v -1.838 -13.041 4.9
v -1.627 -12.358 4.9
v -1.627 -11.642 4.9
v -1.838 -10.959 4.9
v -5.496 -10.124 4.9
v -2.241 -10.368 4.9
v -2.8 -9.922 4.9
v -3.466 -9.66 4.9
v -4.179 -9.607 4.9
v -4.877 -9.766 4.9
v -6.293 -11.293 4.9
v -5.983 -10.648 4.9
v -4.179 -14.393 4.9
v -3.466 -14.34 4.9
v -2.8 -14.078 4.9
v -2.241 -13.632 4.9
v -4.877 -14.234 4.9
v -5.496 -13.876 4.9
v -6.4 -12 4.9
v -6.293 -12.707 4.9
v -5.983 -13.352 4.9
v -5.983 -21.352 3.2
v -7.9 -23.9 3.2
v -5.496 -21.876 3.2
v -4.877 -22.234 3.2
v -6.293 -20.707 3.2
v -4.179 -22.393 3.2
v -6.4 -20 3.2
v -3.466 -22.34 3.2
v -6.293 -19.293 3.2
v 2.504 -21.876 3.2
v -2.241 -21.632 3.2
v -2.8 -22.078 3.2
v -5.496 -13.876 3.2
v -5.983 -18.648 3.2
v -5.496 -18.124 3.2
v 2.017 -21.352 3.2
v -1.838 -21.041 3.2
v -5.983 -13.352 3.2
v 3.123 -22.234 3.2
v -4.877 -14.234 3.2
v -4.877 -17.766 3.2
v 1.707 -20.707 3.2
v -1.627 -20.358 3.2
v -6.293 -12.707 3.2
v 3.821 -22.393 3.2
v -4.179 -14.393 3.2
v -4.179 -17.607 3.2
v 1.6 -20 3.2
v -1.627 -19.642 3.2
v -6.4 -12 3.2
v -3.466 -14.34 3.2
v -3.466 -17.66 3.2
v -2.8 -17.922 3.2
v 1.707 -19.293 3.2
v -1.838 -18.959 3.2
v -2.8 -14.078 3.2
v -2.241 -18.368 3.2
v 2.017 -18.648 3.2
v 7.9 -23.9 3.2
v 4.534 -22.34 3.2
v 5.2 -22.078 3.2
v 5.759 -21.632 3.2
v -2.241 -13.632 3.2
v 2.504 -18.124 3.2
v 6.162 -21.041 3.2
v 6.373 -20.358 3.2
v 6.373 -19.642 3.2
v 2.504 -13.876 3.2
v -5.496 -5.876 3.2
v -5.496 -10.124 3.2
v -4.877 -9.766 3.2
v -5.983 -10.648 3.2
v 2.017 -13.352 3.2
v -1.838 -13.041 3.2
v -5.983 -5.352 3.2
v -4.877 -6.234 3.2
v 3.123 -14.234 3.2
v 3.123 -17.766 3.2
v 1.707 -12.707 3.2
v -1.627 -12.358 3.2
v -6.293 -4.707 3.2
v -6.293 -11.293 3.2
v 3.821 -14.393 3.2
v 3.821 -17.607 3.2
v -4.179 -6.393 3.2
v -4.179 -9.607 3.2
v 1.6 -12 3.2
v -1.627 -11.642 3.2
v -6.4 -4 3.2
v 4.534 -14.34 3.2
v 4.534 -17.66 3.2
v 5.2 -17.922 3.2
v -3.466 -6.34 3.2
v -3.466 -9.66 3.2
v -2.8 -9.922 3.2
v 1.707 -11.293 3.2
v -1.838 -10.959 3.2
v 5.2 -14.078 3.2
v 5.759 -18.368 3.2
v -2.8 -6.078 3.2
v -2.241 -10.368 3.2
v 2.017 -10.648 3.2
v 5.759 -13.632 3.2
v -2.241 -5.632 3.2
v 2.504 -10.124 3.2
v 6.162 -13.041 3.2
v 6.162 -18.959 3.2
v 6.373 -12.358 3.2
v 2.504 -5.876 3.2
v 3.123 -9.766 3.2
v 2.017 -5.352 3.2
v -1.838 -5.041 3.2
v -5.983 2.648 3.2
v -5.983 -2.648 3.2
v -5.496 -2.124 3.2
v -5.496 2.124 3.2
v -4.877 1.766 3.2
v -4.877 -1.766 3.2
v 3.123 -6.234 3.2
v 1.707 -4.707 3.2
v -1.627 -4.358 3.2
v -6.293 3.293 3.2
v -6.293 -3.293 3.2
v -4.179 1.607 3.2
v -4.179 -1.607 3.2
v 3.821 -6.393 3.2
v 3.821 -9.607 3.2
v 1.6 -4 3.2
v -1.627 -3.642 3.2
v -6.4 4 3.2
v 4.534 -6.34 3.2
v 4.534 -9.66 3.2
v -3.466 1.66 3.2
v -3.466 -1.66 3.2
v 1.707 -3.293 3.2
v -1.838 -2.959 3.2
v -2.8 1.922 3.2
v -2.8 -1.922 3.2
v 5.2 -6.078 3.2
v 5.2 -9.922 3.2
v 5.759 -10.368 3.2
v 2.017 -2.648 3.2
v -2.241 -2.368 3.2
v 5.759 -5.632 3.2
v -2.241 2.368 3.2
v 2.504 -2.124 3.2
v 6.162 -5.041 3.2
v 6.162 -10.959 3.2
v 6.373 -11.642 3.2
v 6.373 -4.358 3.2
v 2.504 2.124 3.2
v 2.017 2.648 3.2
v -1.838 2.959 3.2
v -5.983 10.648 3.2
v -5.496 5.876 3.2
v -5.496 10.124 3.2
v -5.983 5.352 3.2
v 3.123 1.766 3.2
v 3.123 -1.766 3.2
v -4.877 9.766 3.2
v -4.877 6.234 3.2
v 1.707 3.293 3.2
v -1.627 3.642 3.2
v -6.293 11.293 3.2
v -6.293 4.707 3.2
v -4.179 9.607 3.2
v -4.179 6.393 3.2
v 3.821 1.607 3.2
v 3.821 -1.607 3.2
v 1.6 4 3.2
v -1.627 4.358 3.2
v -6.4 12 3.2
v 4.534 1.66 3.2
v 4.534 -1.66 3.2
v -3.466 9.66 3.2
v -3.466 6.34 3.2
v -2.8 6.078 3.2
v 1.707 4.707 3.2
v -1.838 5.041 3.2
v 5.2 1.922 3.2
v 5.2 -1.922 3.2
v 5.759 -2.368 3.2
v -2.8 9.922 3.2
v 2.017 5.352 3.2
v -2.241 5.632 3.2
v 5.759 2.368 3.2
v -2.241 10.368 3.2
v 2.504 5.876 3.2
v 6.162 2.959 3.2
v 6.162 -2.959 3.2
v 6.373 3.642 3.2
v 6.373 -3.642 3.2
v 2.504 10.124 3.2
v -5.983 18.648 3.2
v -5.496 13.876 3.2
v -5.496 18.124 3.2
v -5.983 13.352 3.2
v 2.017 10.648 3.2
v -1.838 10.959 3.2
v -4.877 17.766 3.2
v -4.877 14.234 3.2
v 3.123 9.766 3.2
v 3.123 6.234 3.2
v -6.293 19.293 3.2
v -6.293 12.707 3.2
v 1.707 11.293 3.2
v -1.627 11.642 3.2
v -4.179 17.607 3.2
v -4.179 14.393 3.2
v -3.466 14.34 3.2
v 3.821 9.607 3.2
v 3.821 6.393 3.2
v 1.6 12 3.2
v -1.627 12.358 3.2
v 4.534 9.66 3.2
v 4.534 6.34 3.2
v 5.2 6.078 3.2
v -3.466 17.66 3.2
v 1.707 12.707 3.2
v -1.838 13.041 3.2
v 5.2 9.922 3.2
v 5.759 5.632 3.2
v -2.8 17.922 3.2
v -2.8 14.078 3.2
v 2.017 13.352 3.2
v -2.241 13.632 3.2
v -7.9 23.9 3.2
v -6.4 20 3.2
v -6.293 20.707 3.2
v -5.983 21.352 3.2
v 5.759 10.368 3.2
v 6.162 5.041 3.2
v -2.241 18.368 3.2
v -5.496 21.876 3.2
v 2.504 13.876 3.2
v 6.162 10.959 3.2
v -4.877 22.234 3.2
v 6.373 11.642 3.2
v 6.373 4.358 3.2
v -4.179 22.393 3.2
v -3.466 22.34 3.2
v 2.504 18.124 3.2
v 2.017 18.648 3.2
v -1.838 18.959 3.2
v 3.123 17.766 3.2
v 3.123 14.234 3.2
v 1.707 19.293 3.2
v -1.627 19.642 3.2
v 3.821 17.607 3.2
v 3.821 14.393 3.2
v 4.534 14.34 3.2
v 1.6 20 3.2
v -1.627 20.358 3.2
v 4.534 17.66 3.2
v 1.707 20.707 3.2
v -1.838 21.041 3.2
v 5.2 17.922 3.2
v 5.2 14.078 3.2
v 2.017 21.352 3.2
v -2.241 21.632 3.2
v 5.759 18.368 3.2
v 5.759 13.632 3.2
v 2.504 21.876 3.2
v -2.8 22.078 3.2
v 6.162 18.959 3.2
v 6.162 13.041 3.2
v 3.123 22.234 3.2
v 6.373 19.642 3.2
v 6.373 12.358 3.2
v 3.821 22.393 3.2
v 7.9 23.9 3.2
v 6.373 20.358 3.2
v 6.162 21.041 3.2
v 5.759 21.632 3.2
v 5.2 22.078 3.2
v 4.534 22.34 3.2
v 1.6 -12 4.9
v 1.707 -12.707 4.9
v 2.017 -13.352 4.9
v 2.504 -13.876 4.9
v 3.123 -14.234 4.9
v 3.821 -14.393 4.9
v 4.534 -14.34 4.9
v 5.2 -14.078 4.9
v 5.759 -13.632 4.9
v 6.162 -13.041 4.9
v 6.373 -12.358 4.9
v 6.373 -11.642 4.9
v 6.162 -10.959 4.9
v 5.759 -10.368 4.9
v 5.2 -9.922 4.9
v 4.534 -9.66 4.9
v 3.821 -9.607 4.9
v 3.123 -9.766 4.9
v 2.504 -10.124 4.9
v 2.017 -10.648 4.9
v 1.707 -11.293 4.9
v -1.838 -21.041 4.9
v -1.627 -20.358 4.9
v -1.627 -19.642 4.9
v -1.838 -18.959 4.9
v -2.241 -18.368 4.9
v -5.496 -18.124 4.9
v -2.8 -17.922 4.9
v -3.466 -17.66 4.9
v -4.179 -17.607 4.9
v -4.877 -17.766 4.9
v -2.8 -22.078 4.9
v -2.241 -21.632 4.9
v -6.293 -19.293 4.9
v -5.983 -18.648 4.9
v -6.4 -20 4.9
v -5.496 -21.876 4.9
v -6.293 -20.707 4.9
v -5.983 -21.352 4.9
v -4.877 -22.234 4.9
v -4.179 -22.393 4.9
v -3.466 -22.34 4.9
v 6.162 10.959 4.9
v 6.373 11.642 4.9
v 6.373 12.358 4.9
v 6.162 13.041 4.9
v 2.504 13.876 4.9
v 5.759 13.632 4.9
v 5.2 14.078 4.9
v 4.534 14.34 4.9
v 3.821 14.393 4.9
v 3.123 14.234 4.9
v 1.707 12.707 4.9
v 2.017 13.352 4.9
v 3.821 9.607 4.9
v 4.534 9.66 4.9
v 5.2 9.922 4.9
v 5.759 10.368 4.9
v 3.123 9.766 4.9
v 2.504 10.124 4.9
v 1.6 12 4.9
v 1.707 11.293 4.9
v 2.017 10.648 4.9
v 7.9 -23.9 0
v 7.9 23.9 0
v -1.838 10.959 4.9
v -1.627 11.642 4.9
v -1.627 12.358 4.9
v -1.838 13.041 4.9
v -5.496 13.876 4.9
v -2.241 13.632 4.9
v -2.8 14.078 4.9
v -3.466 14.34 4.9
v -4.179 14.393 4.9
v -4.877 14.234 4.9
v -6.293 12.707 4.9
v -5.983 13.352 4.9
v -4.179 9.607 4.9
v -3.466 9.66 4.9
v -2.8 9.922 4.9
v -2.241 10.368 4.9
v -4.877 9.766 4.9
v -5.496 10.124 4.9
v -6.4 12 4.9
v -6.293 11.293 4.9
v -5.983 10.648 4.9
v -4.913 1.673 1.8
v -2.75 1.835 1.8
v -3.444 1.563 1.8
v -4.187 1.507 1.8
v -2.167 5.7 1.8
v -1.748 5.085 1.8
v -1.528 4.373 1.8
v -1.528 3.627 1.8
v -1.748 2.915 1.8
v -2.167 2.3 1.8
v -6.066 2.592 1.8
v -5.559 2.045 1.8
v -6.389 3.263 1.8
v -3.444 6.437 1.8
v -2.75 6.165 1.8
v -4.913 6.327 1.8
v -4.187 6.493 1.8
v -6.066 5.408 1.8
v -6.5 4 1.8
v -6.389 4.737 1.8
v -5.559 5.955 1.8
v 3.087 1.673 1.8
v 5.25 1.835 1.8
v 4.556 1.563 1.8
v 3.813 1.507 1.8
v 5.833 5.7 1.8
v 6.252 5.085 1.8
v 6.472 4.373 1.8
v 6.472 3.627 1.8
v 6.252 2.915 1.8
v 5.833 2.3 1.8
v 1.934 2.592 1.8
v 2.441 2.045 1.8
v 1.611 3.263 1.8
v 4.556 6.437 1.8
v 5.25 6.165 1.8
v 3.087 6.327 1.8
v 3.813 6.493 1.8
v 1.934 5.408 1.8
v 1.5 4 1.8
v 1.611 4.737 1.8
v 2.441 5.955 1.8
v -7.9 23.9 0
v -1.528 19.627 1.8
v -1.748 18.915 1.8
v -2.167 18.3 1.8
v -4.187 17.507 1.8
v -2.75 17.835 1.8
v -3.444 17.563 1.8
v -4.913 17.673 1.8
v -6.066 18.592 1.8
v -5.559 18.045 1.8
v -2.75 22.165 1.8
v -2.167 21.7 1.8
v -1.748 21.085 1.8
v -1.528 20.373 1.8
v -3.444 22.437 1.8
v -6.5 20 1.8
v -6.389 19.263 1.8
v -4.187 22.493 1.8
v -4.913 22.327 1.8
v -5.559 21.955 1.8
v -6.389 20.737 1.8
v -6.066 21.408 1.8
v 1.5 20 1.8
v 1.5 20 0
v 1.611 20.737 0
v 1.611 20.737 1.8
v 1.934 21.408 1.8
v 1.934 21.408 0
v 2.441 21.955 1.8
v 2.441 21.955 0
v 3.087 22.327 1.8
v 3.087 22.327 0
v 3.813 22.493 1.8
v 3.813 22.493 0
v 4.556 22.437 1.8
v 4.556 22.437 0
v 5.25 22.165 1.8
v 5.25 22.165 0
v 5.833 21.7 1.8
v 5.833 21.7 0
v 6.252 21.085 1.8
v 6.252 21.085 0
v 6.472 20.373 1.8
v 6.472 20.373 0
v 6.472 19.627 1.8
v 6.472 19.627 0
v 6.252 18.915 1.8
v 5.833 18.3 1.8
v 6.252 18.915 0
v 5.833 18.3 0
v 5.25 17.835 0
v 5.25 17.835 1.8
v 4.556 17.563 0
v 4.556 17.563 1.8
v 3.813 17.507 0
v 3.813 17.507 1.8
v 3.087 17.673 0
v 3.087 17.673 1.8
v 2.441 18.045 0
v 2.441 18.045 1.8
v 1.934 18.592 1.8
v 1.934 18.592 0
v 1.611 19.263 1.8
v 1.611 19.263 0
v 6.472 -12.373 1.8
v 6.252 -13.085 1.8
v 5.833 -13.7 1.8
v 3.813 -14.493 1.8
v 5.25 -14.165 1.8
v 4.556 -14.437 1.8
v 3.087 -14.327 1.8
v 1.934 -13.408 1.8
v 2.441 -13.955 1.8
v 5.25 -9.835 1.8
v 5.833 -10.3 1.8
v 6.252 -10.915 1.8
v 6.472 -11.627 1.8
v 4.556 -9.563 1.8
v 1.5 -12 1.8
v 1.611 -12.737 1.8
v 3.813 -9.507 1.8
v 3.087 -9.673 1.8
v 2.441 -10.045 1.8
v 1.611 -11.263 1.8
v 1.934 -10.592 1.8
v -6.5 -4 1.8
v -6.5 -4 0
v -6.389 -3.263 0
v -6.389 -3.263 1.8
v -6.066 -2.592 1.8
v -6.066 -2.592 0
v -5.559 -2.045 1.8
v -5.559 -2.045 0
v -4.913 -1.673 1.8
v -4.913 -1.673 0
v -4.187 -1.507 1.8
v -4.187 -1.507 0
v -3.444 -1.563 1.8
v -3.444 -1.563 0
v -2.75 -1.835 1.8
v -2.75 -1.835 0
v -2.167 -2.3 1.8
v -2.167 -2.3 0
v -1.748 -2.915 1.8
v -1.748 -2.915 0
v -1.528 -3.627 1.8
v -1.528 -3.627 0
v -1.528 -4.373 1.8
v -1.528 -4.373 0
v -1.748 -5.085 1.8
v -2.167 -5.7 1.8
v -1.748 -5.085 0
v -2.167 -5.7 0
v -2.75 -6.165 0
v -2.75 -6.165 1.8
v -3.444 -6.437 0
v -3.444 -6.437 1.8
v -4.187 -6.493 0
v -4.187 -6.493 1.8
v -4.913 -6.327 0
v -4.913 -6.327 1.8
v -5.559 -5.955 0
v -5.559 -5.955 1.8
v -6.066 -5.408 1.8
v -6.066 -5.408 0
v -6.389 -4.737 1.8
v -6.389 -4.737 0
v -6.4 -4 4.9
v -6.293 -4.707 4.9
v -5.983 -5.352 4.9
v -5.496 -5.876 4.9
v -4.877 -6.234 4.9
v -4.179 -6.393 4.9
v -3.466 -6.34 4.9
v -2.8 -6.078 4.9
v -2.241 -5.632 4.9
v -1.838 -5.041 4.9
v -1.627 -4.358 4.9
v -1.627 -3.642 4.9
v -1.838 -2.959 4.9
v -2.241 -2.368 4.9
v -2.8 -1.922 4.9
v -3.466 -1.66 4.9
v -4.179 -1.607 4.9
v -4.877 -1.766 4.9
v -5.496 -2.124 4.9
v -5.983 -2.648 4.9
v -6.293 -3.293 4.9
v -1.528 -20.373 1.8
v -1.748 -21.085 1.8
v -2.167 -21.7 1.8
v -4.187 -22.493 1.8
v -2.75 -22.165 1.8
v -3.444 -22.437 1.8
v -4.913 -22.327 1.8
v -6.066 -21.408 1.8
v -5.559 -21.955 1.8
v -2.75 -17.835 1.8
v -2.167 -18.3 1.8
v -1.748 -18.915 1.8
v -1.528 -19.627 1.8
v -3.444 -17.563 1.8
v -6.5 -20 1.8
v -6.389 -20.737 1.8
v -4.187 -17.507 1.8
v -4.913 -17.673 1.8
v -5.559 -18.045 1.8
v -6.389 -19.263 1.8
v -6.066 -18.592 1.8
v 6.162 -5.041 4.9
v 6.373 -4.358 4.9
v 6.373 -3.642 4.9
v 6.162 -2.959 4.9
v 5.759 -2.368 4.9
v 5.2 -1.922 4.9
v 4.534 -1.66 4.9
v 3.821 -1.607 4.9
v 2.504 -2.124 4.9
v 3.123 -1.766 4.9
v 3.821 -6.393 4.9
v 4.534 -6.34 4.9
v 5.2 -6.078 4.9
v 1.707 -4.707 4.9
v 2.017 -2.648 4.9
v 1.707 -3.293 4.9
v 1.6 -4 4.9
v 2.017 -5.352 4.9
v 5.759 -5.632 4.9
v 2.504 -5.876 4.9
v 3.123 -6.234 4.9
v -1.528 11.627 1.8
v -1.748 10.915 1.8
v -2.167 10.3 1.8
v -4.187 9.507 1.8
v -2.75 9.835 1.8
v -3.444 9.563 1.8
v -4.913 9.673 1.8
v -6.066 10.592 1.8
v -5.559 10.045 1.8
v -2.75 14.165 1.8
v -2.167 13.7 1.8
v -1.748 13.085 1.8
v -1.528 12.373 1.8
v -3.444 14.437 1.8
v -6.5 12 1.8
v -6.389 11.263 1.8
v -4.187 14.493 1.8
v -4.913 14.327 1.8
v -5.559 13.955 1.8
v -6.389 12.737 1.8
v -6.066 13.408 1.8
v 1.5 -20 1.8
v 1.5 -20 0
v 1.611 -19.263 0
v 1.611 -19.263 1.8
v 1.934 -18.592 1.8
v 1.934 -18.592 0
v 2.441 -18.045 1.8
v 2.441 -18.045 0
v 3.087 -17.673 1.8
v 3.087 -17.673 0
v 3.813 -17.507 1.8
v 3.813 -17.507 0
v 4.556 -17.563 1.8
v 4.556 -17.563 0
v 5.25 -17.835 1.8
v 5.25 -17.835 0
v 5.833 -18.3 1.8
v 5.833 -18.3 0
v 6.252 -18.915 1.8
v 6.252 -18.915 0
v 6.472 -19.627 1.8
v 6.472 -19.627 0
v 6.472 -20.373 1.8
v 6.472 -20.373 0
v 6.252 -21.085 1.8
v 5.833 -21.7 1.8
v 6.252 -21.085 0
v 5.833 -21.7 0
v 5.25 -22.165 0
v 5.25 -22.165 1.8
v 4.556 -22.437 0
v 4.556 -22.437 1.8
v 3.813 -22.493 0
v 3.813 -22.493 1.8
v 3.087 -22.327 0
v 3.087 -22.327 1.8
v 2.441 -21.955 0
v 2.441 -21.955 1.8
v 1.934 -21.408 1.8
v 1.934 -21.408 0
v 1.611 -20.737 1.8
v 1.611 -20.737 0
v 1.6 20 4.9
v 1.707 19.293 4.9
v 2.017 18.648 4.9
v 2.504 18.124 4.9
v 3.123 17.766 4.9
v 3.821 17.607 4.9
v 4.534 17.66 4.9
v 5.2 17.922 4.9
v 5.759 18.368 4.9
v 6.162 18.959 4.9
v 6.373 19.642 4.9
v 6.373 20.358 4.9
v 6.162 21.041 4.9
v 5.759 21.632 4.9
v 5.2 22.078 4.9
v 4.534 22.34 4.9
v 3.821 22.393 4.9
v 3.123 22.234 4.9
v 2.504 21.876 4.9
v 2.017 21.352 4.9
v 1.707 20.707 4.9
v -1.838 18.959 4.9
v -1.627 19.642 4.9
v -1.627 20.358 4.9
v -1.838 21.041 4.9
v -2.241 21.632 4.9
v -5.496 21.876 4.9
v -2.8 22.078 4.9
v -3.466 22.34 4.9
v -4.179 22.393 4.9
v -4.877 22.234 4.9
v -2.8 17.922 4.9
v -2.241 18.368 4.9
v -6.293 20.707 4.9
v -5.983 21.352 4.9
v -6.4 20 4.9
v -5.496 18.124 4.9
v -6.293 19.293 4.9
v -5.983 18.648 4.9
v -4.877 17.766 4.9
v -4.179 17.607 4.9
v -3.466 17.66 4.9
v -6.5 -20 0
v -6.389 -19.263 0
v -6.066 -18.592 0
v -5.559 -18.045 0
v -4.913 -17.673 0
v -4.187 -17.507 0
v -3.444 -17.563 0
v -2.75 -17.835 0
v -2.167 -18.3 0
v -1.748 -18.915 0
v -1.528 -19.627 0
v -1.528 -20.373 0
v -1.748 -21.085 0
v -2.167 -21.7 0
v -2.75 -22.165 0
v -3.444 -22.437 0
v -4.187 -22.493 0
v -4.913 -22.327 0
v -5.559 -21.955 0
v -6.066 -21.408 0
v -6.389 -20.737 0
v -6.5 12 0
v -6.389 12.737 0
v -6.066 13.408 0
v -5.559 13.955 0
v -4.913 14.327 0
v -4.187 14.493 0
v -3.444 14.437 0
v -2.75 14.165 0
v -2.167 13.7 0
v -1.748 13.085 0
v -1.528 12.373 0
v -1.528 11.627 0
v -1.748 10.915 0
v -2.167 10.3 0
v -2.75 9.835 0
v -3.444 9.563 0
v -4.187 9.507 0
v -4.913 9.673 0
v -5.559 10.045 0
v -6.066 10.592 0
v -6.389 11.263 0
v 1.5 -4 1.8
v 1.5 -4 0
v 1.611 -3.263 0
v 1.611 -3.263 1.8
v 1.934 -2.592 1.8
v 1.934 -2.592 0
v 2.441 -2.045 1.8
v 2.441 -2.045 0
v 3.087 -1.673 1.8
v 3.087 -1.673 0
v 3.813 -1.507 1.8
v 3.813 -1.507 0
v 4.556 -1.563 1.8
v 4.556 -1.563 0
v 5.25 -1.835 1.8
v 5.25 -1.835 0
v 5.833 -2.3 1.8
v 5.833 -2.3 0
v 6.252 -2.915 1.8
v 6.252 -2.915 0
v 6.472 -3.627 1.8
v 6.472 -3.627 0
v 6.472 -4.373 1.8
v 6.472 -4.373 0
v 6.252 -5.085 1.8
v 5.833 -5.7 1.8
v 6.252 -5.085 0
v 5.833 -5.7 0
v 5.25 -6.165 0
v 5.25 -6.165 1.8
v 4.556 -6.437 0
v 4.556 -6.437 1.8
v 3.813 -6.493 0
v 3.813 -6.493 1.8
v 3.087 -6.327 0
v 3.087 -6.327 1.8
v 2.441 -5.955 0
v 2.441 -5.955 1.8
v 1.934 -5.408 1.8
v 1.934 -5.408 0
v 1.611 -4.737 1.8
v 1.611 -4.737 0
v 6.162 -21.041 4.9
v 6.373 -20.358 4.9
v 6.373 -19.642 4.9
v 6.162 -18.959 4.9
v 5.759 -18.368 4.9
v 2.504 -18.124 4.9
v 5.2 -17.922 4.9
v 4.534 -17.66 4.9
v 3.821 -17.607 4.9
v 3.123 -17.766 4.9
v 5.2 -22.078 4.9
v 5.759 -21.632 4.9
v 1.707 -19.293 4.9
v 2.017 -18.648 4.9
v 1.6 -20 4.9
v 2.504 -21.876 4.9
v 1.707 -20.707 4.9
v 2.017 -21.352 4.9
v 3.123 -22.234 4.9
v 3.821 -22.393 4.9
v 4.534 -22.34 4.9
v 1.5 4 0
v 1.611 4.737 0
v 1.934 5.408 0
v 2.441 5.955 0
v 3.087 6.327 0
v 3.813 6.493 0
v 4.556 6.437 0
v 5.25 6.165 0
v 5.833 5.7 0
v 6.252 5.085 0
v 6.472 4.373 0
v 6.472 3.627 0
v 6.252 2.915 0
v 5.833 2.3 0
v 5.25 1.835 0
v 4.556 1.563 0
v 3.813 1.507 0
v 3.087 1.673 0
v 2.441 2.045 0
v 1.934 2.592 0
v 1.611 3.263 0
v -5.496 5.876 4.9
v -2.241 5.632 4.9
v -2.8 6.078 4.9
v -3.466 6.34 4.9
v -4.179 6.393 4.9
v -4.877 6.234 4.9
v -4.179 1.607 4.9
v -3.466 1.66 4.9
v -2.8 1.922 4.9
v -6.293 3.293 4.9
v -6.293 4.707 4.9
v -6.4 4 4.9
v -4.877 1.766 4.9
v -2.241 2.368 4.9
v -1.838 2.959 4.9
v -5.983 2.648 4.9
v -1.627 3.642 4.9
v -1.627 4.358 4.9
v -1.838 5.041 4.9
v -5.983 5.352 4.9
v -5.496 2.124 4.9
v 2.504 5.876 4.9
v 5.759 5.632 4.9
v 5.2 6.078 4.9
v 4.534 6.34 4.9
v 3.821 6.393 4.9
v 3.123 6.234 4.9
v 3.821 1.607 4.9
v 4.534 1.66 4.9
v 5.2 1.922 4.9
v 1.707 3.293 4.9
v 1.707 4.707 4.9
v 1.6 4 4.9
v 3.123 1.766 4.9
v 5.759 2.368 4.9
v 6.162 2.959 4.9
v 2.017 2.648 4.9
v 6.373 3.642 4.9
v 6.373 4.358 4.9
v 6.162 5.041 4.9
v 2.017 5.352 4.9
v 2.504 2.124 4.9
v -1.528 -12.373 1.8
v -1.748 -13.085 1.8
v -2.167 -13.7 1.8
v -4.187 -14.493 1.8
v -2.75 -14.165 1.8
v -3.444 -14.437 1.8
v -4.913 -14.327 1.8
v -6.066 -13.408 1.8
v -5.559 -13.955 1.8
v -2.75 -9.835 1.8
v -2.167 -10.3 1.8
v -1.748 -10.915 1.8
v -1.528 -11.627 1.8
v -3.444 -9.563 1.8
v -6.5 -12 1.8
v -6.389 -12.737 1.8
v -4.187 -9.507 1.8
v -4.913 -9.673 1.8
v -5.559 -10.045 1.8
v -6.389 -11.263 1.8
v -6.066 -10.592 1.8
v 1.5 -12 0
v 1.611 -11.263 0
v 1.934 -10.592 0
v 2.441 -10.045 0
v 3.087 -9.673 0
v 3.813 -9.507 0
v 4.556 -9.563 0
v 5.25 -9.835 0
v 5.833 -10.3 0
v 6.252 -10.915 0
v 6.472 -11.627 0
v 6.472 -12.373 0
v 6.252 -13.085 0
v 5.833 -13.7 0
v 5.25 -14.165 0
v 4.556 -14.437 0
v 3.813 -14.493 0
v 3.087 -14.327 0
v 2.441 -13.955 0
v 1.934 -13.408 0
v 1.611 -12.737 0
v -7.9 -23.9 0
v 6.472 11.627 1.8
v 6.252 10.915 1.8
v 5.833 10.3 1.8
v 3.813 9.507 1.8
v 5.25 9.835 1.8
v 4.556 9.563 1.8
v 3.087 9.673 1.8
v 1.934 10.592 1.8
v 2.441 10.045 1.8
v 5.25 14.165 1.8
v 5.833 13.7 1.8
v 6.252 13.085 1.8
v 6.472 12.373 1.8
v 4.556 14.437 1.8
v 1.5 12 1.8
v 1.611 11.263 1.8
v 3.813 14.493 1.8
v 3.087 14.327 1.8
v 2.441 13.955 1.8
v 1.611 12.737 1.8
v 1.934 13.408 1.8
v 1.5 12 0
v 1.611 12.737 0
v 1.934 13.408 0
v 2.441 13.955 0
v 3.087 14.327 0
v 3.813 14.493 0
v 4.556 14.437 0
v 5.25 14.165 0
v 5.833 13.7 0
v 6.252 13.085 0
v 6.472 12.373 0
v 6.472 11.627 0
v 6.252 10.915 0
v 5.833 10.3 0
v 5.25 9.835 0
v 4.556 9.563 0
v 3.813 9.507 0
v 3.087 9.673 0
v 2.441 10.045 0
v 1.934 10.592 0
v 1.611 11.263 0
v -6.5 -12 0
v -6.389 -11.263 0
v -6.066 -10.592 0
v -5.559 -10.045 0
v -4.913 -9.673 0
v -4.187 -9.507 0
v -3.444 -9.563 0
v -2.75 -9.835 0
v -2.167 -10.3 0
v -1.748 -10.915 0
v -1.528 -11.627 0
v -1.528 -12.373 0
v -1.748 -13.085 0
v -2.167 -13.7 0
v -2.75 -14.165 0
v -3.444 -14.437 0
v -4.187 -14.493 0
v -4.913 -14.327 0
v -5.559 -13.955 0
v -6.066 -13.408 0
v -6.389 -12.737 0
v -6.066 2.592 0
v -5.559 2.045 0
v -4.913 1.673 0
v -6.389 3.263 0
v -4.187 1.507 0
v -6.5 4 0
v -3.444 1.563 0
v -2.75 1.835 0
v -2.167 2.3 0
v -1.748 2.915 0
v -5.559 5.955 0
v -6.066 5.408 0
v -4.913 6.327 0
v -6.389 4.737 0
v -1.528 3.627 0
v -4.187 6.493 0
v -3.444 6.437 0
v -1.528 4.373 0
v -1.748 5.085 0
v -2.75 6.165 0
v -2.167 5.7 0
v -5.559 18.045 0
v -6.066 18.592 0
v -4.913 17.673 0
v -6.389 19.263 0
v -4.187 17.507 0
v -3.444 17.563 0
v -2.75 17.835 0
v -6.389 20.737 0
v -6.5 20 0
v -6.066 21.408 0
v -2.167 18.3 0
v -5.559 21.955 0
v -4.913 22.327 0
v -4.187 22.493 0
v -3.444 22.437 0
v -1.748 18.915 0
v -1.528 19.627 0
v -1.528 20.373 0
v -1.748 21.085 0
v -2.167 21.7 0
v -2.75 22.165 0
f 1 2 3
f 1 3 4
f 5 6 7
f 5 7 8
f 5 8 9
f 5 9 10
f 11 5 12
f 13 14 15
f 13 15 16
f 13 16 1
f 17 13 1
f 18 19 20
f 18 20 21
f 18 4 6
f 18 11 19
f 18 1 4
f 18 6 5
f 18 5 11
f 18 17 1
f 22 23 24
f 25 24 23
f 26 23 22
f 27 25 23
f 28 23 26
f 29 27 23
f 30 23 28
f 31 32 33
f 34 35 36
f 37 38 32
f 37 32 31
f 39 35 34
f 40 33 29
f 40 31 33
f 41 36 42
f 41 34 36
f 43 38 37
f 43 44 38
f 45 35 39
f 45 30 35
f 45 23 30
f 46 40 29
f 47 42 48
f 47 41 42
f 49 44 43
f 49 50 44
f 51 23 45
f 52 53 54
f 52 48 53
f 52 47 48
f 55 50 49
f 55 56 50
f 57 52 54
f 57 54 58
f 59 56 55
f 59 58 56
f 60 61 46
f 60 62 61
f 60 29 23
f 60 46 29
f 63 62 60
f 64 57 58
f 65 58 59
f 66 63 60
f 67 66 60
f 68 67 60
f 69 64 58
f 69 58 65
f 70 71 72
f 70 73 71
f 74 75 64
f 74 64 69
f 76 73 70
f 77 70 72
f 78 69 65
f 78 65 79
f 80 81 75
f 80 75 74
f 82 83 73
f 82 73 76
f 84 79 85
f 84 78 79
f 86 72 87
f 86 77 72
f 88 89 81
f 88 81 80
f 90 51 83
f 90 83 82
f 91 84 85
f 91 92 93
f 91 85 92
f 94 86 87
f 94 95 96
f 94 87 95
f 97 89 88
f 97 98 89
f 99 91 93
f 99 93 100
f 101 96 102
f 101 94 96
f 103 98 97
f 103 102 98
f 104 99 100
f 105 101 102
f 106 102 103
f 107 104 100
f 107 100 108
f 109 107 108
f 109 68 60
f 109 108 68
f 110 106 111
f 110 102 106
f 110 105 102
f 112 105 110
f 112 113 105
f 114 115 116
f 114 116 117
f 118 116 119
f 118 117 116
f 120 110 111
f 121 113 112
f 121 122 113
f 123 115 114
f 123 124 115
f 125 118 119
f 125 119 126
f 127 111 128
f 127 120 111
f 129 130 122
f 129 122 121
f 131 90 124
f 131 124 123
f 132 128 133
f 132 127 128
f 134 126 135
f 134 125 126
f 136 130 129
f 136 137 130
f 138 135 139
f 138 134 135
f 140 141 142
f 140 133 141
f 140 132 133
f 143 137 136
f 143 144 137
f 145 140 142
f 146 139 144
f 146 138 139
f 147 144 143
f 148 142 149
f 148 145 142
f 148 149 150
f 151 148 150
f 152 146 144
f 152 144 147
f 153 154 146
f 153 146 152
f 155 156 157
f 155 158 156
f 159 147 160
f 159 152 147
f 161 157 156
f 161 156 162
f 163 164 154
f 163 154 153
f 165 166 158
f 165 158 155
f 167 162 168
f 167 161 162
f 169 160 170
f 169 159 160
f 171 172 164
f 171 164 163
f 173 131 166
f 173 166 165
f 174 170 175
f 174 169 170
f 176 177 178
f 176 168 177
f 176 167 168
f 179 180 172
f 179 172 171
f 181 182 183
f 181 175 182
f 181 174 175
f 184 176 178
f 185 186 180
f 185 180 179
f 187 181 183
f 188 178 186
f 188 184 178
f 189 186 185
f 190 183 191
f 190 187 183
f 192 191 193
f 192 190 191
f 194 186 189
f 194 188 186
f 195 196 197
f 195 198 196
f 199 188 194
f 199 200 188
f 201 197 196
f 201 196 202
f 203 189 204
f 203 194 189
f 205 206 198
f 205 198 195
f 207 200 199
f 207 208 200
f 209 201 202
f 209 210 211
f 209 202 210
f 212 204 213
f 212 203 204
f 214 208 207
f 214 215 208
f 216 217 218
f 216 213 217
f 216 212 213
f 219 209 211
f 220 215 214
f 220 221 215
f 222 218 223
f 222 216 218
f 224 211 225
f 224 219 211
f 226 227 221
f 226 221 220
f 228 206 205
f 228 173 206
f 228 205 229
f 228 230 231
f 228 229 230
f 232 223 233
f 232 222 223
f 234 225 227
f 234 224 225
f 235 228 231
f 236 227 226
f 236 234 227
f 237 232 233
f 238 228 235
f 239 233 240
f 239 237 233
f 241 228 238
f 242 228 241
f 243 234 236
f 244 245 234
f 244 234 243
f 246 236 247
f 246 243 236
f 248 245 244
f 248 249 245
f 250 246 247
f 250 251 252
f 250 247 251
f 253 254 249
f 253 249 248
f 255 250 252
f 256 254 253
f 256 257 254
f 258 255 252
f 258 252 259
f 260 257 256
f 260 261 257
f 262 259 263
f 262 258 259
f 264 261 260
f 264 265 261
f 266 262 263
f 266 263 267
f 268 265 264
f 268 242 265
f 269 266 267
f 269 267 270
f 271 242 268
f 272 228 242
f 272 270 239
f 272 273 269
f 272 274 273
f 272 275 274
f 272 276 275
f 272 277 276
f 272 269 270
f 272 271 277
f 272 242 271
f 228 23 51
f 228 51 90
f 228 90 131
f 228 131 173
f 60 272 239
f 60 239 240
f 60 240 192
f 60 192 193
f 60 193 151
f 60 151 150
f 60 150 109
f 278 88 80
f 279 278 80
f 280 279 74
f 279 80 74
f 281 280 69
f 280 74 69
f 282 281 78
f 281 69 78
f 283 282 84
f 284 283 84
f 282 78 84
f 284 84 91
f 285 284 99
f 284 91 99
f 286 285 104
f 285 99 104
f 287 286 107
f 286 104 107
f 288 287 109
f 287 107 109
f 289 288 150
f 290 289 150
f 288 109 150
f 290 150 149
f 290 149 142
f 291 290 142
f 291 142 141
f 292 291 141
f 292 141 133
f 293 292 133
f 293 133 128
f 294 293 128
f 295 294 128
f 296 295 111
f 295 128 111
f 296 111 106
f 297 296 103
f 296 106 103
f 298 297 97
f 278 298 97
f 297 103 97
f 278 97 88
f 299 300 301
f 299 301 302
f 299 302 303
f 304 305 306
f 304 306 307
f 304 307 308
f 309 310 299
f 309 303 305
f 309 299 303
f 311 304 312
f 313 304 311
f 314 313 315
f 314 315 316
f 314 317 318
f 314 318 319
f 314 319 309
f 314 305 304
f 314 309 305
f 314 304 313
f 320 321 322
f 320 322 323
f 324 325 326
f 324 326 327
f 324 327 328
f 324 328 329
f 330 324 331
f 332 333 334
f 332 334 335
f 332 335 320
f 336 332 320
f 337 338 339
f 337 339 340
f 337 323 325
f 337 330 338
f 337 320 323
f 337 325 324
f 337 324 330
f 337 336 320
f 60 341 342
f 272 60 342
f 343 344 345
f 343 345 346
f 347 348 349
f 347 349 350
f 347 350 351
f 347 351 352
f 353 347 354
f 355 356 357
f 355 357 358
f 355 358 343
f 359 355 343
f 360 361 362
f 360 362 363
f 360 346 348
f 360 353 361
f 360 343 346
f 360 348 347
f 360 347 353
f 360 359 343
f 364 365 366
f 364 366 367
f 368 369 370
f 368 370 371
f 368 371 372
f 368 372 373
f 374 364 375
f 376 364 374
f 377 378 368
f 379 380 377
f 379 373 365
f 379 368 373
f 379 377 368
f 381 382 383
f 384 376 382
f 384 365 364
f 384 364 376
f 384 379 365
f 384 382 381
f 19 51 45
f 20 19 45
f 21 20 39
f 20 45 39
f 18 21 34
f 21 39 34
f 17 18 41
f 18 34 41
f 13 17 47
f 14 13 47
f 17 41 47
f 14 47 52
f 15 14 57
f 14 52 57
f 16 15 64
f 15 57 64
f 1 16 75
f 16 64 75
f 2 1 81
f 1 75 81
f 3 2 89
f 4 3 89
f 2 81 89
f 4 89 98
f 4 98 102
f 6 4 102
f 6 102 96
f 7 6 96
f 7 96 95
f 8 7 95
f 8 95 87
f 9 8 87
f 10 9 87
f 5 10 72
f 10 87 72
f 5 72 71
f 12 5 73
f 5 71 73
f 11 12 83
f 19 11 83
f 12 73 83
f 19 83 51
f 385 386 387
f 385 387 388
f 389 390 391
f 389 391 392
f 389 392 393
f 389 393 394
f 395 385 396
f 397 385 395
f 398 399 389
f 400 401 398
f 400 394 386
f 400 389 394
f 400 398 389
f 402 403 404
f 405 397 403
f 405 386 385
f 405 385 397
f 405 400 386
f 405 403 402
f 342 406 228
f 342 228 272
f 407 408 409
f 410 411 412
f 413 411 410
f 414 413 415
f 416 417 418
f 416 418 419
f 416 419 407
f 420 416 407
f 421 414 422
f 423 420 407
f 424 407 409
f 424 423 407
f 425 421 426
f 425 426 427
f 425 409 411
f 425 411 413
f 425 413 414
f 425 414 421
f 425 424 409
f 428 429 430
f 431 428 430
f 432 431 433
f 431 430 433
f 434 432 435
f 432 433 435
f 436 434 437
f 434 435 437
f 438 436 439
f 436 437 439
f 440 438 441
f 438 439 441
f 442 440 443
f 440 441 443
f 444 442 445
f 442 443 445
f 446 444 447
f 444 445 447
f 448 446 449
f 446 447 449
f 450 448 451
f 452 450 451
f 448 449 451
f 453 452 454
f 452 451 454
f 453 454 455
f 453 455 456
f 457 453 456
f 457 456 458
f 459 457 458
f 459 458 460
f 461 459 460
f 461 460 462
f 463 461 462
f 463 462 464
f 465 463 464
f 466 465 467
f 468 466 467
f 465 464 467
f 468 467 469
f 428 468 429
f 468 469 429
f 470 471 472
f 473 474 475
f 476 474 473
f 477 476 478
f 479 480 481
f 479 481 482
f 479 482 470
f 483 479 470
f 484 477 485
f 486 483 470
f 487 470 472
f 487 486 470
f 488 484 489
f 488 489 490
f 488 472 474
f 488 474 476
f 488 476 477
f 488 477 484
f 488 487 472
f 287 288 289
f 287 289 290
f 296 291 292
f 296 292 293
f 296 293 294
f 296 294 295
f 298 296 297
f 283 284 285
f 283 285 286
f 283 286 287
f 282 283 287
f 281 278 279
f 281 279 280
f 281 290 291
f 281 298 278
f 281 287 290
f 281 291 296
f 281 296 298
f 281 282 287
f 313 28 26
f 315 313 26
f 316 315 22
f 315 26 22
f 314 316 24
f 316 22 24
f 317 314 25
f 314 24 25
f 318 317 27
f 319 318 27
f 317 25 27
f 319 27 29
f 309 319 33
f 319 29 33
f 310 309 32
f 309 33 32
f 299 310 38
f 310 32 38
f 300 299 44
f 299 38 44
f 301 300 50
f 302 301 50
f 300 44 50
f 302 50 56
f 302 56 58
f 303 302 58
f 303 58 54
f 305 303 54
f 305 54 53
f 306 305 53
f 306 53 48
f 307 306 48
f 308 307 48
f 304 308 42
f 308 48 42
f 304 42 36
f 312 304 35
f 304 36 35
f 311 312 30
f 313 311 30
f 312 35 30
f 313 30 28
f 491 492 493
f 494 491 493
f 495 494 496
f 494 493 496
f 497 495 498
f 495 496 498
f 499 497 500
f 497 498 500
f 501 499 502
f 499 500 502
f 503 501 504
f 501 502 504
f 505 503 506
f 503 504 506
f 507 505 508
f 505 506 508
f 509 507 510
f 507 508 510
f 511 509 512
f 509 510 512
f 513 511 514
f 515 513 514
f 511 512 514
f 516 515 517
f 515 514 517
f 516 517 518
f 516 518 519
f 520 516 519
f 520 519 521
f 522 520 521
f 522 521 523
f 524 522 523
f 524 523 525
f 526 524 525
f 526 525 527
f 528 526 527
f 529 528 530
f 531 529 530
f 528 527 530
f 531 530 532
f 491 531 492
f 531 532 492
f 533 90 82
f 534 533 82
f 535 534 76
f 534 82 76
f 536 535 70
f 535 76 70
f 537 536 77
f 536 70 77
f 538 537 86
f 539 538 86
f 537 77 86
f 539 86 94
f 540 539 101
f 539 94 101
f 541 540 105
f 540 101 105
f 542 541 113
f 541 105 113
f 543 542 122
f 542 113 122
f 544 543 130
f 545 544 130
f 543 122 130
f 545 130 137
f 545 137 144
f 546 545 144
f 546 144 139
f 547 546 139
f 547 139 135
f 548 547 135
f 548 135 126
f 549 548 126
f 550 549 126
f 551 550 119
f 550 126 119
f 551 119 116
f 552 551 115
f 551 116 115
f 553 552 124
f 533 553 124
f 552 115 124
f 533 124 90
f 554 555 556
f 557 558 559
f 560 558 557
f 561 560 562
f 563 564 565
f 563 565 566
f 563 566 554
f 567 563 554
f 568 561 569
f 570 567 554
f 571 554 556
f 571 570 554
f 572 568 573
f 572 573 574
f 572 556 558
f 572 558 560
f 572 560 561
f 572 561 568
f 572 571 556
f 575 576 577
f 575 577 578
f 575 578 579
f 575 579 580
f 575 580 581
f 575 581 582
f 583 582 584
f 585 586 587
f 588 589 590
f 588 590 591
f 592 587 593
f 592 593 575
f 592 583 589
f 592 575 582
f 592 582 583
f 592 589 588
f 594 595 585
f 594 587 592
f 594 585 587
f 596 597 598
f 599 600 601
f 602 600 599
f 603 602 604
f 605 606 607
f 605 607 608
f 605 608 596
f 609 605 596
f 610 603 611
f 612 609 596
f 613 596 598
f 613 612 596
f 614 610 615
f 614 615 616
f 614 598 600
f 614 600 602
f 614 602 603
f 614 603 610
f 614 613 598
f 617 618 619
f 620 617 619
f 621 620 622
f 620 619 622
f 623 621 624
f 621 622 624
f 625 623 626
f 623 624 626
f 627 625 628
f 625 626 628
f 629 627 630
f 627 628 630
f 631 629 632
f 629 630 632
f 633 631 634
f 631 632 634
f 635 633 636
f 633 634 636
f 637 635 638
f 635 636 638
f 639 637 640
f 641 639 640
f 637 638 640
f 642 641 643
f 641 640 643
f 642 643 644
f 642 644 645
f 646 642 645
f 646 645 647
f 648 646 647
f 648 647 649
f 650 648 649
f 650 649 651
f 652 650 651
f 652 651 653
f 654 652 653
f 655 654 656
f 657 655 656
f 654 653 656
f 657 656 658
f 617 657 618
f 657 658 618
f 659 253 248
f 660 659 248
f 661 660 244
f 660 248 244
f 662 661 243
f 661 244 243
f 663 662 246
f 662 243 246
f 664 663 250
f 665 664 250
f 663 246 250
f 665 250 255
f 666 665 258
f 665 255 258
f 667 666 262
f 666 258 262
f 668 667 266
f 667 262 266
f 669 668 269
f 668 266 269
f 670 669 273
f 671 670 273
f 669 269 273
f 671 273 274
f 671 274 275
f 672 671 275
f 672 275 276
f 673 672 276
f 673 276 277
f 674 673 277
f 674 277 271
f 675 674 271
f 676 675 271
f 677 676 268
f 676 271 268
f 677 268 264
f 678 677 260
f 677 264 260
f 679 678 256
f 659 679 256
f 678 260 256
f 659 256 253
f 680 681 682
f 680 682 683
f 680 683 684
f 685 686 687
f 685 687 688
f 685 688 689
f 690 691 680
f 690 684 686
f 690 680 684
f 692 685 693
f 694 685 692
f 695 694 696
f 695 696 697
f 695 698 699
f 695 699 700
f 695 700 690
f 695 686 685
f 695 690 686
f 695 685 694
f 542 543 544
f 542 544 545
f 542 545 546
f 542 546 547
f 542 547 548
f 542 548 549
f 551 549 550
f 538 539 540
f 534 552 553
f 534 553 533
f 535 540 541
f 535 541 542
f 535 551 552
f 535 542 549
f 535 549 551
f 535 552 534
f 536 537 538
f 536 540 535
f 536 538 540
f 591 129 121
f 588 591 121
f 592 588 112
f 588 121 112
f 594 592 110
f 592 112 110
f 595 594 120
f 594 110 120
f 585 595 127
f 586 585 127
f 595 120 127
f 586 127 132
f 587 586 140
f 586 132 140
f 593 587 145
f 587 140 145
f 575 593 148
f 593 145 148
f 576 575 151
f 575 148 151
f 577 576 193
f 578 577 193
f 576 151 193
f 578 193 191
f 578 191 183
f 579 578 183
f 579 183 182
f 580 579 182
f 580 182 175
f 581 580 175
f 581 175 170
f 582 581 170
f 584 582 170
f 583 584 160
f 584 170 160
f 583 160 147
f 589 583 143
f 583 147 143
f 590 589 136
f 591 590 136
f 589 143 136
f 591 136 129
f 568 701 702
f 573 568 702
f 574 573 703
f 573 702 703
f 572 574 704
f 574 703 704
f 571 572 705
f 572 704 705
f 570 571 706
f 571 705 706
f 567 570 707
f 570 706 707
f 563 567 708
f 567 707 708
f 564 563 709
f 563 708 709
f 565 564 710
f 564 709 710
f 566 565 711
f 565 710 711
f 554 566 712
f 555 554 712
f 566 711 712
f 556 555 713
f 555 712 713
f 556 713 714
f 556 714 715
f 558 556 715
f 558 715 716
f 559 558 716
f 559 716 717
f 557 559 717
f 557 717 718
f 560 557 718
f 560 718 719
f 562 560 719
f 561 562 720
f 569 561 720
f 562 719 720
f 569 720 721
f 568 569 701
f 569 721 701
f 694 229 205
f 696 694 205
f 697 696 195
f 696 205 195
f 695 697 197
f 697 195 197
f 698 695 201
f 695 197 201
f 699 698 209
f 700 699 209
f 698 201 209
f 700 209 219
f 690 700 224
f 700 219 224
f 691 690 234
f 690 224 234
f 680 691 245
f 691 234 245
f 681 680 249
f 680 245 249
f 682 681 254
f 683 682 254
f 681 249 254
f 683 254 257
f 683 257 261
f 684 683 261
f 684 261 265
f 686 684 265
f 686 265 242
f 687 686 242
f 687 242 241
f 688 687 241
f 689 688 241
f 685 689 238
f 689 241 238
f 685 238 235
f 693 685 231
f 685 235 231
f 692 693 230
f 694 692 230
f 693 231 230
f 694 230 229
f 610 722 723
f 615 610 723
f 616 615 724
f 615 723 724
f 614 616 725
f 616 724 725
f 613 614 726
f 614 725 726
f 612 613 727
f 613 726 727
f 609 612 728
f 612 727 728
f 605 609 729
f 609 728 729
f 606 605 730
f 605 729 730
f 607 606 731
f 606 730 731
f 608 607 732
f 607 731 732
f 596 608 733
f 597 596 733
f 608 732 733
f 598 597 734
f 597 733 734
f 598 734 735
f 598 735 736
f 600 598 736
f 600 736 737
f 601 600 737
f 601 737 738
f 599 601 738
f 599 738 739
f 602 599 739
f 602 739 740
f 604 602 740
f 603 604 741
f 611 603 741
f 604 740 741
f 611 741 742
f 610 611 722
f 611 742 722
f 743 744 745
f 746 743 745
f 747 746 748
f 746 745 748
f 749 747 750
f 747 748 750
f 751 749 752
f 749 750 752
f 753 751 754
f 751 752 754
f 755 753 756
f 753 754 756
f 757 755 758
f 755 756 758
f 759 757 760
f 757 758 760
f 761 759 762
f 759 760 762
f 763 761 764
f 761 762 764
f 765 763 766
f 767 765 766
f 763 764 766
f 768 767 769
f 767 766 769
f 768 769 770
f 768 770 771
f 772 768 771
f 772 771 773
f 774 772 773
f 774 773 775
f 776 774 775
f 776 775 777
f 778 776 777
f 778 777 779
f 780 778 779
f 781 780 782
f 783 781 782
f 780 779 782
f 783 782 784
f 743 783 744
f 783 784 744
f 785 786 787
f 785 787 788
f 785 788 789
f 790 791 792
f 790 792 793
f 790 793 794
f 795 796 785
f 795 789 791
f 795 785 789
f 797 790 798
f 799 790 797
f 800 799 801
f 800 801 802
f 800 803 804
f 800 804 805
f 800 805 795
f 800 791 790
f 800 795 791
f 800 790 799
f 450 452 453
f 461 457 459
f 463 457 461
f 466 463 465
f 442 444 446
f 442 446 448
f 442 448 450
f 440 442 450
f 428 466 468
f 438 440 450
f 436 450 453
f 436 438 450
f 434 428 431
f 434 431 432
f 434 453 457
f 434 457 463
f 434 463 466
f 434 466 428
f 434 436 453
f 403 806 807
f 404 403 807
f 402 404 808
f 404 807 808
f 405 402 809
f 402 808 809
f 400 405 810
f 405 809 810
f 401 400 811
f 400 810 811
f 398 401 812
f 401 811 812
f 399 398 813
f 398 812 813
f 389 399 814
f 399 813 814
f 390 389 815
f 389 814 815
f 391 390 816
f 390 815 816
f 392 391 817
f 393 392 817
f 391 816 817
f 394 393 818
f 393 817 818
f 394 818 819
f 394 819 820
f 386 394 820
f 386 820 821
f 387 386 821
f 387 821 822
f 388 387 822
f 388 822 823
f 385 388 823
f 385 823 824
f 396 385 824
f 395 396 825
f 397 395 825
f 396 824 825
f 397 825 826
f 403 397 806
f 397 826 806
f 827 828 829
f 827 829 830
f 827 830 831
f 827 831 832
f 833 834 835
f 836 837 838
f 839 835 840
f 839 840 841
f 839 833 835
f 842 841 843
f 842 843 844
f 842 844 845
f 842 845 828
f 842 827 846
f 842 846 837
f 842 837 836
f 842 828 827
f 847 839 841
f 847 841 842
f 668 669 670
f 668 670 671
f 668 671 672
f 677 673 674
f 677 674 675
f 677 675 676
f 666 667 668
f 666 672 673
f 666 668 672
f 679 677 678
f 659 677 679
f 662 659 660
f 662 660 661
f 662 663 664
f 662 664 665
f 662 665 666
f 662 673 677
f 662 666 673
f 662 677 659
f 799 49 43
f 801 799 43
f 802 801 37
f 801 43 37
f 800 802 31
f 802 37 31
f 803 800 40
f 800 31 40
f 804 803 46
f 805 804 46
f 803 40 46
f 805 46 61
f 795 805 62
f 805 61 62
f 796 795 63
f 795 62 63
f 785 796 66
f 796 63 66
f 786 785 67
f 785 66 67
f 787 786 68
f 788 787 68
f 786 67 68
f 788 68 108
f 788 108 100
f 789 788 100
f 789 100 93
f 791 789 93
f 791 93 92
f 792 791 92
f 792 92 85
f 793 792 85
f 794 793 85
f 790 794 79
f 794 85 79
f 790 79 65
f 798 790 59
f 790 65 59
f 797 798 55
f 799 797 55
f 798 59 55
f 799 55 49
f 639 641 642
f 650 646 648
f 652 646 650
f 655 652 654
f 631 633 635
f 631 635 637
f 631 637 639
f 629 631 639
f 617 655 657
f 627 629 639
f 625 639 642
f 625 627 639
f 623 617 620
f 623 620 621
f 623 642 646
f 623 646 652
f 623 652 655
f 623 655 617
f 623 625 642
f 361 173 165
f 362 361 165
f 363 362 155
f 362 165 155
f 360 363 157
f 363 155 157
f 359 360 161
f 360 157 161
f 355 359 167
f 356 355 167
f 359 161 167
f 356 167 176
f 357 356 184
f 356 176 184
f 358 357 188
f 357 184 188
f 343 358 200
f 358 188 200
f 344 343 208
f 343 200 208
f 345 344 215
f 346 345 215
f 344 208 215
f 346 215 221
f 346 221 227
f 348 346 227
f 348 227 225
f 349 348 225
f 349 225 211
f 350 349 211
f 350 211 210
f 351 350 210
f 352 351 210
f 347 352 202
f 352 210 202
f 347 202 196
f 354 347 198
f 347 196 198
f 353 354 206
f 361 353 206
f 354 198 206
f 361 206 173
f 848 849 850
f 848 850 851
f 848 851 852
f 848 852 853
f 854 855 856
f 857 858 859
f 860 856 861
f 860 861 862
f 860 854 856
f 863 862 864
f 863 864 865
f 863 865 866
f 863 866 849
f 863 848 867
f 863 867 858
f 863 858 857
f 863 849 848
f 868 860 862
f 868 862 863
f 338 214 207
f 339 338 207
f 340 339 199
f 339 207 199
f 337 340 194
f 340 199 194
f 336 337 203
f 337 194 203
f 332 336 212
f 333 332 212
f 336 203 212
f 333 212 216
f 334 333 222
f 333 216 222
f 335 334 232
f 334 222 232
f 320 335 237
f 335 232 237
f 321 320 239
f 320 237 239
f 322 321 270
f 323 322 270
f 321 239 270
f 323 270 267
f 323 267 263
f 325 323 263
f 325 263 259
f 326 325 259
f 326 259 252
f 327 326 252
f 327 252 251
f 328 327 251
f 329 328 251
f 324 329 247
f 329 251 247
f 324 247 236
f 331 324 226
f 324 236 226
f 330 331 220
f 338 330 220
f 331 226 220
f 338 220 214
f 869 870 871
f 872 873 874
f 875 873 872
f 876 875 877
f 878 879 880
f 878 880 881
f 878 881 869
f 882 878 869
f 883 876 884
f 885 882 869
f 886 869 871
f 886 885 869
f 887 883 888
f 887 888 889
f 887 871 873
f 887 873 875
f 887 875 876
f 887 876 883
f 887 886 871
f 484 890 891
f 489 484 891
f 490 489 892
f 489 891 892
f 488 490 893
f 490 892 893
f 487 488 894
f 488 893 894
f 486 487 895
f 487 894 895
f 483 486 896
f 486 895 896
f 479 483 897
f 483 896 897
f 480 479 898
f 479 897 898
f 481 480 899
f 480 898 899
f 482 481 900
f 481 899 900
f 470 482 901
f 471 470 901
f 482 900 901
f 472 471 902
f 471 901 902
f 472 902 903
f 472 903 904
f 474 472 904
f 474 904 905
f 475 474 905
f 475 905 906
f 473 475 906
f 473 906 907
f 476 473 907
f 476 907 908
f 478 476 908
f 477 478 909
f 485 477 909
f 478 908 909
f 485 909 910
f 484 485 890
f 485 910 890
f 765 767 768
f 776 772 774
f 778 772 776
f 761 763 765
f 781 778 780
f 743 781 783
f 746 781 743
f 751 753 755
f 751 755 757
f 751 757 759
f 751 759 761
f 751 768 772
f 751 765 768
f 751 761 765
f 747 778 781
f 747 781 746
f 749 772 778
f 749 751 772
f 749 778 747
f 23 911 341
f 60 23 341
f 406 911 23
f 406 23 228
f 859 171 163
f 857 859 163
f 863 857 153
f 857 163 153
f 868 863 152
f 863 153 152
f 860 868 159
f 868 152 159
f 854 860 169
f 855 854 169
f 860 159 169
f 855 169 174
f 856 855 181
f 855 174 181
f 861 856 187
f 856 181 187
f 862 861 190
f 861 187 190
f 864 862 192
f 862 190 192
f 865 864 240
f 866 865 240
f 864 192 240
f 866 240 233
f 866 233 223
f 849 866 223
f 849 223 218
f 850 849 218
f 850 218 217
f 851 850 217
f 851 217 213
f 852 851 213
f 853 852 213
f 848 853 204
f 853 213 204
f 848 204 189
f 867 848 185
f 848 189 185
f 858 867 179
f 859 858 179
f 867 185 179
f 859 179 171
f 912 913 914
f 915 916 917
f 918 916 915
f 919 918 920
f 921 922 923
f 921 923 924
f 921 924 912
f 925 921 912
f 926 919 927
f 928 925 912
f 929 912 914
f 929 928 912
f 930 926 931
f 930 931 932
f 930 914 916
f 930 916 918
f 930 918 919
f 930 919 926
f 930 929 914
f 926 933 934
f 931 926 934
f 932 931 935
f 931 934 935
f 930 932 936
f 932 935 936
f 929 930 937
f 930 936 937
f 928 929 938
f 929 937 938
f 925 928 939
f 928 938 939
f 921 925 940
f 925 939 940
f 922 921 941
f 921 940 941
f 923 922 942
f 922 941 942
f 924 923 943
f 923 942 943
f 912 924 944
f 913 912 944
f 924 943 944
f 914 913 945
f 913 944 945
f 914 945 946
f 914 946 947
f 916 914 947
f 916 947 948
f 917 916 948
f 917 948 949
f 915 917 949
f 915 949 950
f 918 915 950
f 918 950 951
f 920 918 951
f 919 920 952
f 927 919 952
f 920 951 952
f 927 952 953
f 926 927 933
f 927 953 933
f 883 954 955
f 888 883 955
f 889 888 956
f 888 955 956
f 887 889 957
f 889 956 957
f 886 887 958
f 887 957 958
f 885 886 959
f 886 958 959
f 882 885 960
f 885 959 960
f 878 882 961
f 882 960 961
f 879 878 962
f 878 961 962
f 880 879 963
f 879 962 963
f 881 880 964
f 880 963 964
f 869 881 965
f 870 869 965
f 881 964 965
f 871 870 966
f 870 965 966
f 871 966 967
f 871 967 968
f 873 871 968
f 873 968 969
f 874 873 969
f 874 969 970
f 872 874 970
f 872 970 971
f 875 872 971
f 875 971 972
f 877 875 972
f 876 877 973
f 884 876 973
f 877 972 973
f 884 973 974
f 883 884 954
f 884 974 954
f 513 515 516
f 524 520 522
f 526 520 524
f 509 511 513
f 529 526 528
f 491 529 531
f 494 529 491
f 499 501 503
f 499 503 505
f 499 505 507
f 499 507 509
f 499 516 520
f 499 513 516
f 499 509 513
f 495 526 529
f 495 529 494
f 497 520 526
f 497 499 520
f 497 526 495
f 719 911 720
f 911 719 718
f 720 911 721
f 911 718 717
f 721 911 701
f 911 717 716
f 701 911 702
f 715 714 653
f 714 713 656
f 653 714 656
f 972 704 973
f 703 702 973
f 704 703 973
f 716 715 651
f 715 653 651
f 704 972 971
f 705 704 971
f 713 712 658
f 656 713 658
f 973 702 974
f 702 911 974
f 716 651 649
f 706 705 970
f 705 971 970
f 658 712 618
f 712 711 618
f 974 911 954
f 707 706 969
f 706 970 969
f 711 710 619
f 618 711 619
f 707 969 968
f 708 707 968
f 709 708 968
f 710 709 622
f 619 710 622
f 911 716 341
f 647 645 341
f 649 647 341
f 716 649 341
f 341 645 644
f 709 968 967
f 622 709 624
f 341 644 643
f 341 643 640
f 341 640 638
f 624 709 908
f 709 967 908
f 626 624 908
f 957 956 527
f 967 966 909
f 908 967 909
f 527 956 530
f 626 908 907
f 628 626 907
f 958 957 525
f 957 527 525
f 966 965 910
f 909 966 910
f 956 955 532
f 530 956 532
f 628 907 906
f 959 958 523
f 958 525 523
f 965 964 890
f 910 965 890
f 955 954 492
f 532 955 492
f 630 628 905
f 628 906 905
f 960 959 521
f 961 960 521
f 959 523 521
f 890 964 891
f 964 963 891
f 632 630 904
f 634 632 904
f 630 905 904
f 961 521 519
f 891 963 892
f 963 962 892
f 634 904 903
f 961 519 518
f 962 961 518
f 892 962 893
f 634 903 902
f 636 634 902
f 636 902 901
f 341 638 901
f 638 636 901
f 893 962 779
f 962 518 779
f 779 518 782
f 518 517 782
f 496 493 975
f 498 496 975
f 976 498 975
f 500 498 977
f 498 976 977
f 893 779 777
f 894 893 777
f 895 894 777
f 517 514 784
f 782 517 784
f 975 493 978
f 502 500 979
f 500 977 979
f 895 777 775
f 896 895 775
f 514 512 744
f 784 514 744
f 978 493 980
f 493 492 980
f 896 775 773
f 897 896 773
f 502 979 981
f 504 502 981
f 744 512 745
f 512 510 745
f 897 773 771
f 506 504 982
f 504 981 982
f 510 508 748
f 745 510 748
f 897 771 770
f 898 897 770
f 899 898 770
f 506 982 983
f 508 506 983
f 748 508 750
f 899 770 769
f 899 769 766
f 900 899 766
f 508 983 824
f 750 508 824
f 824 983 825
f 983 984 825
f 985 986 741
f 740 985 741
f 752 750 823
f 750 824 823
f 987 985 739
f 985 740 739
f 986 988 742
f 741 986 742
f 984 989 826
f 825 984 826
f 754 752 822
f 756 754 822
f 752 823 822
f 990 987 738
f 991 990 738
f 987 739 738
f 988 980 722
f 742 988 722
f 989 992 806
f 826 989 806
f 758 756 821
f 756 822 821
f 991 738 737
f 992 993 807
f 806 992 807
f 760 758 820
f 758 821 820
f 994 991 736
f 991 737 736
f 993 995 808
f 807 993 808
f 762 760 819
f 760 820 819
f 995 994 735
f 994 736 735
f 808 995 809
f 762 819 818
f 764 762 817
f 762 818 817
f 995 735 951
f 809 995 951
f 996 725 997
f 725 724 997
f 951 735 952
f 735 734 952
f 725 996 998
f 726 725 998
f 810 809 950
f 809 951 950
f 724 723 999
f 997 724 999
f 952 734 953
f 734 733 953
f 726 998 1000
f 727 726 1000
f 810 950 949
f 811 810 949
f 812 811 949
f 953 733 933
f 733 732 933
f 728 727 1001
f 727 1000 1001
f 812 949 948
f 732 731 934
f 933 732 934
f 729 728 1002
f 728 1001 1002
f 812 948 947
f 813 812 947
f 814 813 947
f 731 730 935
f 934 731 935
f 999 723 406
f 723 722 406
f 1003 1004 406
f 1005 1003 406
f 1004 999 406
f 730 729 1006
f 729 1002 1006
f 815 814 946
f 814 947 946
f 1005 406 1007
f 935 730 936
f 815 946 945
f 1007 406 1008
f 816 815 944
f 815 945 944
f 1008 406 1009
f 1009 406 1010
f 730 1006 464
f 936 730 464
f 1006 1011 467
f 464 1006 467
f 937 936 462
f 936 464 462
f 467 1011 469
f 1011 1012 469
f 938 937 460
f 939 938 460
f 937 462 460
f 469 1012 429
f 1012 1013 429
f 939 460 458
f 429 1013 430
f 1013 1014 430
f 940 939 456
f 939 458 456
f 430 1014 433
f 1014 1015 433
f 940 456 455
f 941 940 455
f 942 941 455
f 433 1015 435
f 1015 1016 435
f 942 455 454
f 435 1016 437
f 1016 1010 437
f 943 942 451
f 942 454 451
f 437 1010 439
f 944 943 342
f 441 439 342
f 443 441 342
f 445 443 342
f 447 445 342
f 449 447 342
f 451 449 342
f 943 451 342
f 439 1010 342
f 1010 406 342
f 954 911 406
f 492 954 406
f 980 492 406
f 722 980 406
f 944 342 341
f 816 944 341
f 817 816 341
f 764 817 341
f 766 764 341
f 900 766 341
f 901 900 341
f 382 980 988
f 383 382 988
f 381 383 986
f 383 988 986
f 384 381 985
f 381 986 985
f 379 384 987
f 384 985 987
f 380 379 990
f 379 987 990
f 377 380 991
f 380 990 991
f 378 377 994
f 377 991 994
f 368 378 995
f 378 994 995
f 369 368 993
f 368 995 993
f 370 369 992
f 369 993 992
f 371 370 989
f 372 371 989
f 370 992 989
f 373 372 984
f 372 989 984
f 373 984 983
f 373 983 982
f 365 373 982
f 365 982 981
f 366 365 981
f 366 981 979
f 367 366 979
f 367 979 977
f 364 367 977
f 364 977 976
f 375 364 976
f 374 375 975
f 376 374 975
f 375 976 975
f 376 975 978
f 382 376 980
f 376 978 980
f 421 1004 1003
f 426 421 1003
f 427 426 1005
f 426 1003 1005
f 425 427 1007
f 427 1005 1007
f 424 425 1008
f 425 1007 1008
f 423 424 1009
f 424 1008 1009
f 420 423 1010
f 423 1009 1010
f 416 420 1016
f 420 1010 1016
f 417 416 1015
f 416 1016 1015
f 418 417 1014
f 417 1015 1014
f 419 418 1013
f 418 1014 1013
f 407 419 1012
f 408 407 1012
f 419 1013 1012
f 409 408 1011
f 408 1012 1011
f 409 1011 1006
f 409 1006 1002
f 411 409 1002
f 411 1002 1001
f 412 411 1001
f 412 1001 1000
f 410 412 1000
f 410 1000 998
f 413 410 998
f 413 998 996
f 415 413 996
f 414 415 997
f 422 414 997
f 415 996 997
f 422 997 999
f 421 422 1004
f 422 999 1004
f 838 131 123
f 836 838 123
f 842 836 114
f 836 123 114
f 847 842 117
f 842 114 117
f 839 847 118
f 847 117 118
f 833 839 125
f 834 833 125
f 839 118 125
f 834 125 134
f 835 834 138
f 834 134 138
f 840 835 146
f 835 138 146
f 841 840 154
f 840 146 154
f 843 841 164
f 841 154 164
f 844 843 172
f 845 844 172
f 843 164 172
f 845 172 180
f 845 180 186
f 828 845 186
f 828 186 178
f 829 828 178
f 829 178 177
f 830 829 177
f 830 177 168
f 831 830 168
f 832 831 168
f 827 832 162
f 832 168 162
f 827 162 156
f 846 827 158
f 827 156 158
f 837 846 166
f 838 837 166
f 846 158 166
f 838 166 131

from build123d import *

# Parameters (mm, degrees)
SKETCH_1_W          = 15.8
SKETCH_1_H          = 47.8
EXTRUDE_1_DEPTH     = 3.2
SKETCH_2_R          = 2.4
EXTRUDE_2_DEPTH     = 1.7
SKETCH_3_R          = 2.5
CUT_EXTRUDE_2_DEPTH = 1.8


with BuildPart() as part:
    # Эскиз1 → Бобышка-Вытянуть1 (new body)
    with BuildSketch(Plane.XY):
        Rectangle(SKETCH_1_W, SKETCH_1_H)
    extrude(amount=EXTRUDE_1_DEPTH)

    # Эскиз2 → Бобышка-Вытянуть2 (add)
    with BuildSketch(Plane.XY.offset(3.2)):
        with Locations(Location((-4, 20, 0), (0, 0, 180))):
            Circle(SKETCH_2_R)
        with Locations(Location((4, 20, 0), (0, 0, 180))):
            Circle(SKETCH_2_R)
        with Locations(Location((4, 12, 0), (0, 0, 180))):
            Circle(SKETCH_2_R)
        with Locations(Location((4, 4, 0), (0, 0, 180))):
            Circle(SKETCH_2_R)
        with Locations(Location((4, -4, 0), (0, 0, 180))):
            Circle(SKETCH_2_R)
        with Locations(Location((4, -12, 0), (0, 0, 180))):
            Circle(SKETCH_2_R)
        with Locations(Location((4, -20, 0), (0, 0, 180))):
            Circle(SKETCH_2_R)
        with Locations(Location((-4, 12, 0), (0, 0, 180))):
            Circle(SKETCH_2_R)
        with Locations(Location((-4, 4, 0), (0, 0, 180))):
            Circle(SKETCH_2_R)
        with Locations(Location((-4, -4, 0), (0, 0, 180))):
            Circle(SKETCH_2_R)
        with Locations(Location((-4, -12, 0), (0, 0, 180))):
            Circle(SKETCH_2_R)
        with Locations(Location((-4, -20, 0), (0, 0, 180))):
            Circle(SKETCH_2_R)
    extrude(amount=EXTRUDE_2_DEPTH)

    # Эскиз3 → Вырез-Вытянуть2 (cut)
    with BuildSketch(Plane(origin=(0, 0, 0), x_dir=(-1, 0, 0), z_dir=(0, 0, -1))):
        with Locations((-4, 20)):
            Circle(SKETCH_3_R)
        with Locations((4, 20)):
            Circle(SKETCH_3_R)
        with Locations((4, 12)):
            Circle(SKETCH_3_R)
        with Locations((4, 4)):
            Circle(SKETCH_3_R)
        with Locations((4, -4)):
            Circle(SKETCH_3_R)
        with Locations((4, -12)):
            Circle(SKETCH_3_R)
        with Locations((4, -20)):
            Circle(SKETCH_3_R)
        with Locations((-4, 12)):
            Circle(SKETCH_3_R)
        with Locations((-4, 4)):
            Circle(SKETCH_3_R)
        with Locations((-4, -4)):
            Circle(SKETCH_3_R)
        with Locations((-4, -12)):
            Circle(SKETCH_3_R)
        with Locations((-4, -20)):
            Circle(SKETCH_3_R)
    extrude(amount=-CUT_EXTRUDE_2_DEPTH, mode=Mode.SUBTRACT)


solid = part.part
